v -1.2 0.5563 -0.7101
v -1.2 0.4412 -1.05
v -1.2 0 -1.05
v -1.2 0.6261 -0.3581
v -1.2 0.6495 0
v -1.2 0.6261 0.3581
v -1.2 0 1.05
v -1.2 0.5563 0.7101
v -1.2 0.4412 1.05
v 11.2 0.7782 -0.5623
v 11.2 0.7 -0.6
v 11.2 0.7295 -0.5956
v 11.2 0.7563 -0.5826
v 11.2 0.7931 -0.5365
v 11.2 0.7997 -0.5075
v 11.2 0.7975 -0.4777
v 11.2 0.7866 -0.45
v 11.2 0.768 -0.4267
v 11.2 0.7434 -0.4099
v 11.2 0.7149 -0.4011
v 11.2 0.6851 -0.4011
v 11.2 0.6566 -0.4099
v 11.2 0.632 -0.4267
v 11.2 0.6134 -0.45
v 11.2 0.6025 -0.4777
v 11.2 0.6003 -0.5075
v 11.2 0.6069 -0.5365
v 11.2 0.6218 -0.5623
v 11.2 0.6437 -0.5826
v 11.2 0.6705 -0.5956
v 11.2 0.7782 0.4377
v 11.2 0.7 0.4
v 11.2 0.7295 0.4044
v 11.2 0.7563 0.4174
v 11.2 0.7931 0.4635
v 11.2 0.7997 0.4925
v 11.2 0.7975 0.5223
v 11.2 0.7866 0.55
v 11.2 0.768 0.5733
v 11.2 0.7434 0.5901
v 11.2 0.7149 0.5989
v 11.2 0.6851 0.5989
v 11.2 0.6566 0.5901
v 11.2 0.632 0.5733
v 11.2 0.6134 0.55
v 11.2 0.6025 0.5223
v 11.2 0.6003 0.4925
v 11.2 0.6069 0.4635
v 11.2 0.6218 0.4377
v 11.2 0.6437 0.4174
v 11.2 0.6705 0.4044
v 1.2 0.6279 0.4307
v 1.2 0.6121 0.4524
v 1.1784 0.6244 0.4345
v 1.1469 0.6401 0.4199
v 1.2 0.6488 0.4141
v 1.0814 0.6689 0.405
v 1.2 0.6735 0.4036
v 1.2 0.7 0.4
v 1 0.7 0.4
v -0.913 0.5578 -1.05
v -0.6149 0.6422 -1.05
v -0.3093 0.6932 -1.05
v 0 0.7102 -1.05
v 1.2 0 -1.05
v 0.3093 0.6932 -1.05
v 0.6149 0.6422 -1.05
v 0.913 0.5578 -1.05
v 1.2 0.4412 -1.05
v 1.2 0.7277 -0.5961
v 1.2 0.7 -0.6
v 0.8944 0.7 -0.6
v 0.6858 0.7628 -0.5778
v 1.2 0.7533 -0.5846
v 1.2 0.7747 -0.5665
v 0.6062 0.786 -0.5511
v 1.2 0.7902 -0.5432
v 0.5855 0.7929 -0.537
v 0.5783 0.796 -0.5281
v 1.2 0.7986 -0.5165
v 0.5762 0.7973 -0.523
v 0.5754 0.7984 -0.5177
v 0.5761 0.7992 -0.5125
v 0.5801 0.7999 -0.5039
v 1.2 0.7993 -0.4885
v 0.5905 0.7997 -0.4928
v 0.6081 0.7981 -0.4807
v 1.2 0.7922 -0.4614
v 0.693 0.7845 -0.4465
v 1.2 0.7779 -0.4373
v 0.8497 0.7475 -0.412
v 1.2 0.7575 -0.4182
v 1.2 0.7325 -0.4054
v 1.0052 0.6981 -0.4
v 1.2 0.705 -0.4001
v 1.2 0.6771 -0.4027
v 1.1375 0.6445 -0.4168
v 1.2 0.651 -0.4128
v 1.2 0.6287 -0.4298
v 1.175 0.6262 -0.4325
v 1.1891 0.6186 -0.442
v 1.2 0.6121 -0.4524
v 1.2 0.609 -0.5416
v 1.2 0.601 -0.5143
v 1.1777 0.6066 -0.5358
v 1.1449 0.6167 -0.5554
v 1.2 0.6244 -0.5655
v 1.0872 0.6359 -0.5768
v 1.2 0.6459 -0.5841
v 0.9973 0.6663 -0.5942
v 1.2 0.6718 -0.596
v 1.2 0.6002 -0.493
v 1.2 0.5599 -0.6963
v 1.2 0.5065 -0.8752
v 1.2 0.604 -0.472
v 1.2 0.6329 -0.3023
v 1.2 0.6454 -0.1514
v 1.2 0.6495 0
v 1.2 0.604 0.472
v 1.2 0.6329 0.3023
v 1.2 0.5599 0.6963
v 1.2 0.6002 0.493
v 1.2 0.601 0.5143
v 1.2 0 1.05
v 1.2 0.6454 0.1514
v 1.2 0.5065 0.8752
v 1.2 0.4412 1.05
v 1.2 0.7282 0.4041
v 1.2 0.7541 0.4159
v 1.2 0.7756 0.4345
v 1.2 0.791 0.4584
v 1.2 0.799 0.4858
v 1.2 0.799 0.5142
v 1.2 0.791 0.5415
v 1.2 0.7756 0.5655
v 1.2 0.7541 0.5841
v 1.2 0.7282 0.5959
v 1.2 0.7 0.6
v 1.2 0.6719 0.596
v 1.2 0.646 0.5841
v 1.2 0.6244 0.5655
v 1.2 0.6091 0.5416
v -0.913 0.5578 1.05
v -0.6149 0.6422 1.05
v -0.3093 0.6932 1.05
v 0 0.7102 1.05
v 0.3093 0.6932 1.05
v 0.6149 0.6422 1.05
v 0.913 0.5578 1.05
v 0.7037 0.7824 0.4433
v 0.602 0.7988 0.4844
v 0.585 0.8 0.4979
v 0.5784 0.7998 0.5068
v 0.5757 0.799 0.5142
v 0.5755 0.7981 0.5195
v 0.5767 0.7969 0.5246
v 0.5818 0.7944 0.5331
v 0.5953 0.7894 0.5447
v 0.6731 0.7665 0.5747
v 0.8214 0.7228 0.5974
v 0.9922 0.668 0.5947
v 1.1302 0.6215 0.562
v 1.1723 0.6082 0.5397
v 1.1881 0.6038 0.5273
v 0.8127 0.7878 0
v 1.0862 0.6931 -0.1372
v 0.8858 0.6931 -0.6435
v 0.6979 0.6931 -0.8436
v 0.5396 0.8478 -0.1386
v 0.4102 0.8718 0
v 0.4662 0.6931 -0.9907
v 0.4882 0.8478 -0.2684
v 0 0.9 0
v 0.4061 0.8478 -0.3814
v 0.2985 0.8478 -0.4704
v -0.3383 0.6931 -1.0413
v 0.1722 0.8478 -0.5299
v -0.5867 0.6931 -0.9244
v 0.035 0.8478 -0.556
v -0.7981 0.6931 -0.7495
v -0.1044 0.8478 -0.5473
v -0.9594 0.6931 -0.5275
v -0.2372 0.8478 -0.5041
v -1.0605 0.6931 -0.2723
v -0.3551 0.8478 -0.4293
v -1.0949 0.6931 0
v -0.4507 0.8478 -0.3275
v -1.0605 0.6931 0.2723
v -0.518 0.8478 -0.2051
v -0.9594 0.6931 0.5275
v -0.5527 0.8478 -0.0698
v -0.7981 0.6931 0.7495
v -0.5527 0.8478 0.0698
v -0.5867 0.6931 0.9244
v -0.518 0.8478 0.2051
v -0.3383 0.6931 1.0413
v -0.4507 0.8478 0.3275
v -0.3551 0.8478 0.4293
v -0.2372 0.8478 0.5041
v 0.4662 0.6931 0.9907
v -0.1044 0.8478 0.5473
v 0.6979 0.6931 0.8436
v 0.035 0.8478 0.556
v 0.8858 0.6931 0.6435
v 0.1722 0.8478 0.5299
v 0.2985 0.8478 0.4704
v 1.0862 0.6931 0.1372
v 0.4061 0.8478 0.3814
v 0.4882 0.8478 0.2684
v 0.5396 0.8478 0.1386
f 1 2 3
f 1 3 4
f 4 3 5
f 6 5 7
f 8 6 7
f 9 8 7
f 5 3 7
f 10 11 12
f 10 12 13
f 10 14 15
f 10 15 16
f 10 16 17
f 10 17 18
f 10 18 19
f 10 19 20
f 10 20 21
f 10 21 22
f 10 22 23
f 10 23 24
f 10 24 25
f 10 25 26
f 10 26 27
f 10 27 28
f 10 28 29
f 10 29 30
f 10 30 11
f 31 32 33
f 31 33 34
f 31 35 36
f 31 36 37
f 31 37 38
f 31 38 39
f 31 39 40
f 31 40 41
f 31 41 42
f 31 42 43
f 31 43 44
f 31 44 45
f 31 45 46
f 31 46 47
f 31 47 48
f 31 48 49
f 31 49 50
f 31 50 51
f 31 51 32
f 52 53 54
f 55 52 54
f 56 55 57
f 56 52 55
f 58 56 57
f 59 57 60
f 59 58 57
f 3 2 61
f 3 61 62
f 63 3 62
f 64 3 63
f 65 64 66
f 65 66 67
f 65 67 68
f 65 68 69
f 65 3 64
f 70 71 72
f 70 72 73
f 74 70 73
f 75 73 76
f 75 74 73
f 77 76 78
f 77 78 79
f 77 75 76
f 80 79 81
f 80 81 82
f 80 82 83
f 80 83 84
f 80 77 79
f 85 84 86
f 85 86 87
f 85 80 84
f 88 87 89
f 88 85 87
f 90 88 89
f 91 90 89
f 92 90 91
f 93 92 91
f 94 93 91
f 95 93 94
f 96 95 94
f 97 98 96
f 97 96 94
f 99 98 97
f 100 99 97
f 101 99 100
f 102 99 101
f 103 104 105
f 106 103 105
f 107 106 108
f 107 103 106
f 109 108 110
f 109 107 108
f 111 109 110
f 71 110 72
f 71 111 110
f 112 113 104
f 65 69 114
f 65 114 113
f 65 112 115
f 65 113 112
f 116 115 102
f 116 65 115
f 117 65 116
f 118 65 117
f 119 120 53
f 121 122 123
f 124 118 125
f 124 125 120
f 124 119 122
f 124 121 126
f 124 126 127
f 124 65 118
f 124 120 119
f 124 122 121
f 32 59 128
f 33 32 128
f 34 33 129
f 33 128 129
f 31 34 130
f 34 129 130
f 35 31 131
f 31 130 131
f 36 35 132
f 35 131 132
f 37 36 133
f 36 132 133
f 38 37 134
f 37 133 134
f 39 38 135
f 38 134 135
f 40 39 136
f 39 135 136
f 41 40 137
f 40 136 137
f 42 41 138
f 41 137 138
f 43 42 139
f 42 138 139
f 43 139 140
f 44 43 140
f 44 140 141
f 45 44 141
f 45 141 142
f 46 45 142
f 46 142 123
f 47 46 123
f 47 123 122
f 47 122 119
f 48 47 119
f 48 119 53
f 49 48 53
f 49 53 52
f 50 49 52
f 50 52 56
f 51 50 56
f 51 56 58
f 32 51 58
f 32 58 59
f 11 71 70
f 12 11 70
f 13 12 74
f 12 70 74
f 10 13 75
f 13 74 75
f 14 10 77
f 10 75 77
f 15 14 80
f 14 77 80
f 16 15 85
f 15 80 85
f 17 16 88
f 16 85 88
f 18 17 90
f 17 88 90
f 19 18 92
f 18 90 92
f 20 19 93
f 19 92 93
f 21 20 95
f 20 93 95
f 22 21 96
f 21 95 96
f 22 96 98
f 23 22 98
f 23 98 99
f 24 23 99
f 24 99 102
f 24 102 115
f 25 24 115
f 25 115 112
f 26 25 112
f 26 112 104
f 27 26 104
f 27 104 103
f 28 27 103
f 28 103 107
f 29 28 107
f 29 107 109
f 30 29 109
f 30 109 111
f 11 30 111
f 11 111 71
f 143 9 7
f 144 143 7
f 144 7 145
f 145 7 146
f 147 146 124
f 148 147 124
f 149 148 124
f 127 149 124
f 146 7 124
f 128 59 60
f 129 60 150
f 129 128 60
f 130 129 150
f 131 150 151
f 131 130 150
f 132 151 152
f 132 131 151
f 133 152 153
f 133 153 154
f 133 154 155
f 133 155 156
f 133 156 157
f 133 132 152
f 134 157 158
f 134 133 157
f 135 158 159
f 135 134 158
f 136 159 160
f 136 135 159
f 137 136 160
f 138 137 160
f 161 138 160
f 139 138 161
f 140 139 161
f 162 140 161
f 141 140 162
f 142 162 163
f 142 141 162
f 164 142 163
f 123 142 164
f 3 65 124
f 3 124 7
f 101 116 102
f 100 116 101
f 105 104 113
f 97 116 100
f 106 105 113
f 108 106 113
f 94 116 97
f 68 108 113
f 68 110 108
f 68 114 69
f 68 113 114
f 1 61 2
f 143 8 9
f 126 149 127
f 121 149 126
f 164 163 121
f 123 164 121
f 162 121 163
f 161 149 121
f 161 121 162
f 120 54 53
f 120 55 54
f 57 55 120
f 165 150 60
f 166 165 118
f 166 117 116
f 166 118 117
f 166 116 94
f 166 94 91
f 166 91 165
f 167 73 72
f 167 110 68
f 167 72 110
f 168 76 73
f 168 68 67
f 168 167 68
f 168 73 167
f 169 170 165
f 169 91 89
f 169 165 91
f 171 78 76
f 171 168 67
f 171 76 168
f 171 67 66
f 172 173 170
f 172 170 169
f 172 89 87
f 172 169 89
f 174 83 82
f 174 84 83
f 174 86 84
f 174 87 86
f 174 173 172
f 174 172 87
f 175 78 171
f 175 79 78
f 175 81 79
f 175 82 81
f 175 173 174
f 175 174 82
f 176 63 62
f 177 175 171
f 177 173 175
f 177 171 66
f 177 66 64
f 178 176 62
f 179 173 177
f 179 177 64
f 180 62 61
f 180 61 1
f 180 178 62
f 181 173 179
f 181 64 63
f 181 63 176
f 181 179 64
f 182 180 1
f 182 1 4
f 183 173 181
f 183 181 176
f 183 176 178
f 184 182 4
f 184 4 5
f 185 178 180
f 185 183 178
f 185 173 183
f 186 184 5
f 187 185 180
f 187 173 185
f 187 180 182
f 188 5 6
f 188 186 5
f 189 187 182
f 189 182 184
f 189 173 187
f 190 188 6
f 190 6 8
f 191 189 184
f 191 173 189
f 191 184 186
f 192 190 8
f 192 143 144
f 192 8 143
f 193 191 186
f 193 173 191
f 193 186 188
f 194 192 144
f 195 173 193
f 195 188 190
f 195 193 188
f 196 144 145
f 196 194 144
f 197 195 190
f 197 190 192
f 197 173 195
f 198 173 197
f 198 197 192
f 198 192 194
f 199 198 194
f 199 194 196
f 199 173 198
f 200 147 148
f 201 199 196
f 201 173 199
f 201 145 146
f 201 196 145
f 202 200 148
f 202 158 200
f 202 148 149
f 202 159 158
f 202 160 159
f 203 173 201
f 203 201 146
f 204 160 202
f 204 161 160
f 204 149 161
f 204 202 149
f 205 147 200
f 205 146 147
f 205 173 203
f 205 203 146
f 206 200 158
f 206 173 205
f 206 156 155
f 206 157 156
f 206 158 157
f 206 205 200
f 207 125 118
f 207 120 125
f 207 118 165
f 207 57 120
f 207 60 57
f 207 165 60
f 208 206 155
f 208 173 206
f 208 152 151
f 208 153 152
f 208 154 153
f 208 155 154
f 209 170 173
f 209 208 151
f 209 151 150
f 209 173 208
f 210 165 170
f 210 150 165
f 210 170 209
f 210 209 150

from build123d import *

# Parameters (mm, degrees)
SKETCH_3_OUTSIDE_W   = 6.506
SKETCH_3_OUTSIDE_H   = 6.506
SKETCH_3_OUTSIDE_W_2 = 2.4
SKETCH_3_OUTSIDE_H_2 = 2.1
CUT_EXTRUDE_1_DEPTH  = 1.9
SKETCH_4_R           = 0.1
EXTRUDE_2_DEPTH      = 10
EXTRUDE_2_DEPTH_BACK = 1


with BuildPart() as part:
    # Эскиз2 → Повернуть1 (revolve)
    with BuildSketch(Plane.XY):
        with BuildLine():
            Line((0, 0), (1.75, 0))
            Line((1.75, 0), (1.75, 0.336698586))
            ThreePointArc((1.75, 0.336698586), (0.919212772, 0.755704445), (0, 0.9))
            Line((0, 0.9), (0, 0))
        make_face()
    revolve(axis=Axis((0, 0, 0), (0, 1, 0)))

    # Эскиз3 outside → Вырез-Вытянуть1 (cut, through all)
    with BuildSketch(Plane.XZ):
        Rectangle(SKETCH_3_OUTSIDE_W, SKETCH_3_OUTSIDE_H)
        Rectangle(SKETCH_3_OUTSIDE_W_2, SKETCH_3_OUTSIDE_H_2, mode=Mode.SUBTRACT)
    extrude(amount=-CUT_EXTRUDE_1_DEPTH, mode=Mode.SUBTRACT)

    # Эскиз4 → Бобышка-Вытянуть2 (add, two sides)
    with BuildSketch(Plane(origin=(1.2, 0, 0), x_dir=(0, 0, -1), z_dir=(1, 0, 0))) as extrude_2_sk:
        with Locations((-0.5, 0.7)):
            Circle(SKETCH_4_R)
        with Locations((0.5, 0.7)):
            Circle(SKETCH_4_R)
    extrude(amount=EXTRUDE_2_DEPTH)
    extrude(extrude_2_sk.sketch, amount=-EXTRUDE_2_DEPTH_BACK)


solid = part.part
